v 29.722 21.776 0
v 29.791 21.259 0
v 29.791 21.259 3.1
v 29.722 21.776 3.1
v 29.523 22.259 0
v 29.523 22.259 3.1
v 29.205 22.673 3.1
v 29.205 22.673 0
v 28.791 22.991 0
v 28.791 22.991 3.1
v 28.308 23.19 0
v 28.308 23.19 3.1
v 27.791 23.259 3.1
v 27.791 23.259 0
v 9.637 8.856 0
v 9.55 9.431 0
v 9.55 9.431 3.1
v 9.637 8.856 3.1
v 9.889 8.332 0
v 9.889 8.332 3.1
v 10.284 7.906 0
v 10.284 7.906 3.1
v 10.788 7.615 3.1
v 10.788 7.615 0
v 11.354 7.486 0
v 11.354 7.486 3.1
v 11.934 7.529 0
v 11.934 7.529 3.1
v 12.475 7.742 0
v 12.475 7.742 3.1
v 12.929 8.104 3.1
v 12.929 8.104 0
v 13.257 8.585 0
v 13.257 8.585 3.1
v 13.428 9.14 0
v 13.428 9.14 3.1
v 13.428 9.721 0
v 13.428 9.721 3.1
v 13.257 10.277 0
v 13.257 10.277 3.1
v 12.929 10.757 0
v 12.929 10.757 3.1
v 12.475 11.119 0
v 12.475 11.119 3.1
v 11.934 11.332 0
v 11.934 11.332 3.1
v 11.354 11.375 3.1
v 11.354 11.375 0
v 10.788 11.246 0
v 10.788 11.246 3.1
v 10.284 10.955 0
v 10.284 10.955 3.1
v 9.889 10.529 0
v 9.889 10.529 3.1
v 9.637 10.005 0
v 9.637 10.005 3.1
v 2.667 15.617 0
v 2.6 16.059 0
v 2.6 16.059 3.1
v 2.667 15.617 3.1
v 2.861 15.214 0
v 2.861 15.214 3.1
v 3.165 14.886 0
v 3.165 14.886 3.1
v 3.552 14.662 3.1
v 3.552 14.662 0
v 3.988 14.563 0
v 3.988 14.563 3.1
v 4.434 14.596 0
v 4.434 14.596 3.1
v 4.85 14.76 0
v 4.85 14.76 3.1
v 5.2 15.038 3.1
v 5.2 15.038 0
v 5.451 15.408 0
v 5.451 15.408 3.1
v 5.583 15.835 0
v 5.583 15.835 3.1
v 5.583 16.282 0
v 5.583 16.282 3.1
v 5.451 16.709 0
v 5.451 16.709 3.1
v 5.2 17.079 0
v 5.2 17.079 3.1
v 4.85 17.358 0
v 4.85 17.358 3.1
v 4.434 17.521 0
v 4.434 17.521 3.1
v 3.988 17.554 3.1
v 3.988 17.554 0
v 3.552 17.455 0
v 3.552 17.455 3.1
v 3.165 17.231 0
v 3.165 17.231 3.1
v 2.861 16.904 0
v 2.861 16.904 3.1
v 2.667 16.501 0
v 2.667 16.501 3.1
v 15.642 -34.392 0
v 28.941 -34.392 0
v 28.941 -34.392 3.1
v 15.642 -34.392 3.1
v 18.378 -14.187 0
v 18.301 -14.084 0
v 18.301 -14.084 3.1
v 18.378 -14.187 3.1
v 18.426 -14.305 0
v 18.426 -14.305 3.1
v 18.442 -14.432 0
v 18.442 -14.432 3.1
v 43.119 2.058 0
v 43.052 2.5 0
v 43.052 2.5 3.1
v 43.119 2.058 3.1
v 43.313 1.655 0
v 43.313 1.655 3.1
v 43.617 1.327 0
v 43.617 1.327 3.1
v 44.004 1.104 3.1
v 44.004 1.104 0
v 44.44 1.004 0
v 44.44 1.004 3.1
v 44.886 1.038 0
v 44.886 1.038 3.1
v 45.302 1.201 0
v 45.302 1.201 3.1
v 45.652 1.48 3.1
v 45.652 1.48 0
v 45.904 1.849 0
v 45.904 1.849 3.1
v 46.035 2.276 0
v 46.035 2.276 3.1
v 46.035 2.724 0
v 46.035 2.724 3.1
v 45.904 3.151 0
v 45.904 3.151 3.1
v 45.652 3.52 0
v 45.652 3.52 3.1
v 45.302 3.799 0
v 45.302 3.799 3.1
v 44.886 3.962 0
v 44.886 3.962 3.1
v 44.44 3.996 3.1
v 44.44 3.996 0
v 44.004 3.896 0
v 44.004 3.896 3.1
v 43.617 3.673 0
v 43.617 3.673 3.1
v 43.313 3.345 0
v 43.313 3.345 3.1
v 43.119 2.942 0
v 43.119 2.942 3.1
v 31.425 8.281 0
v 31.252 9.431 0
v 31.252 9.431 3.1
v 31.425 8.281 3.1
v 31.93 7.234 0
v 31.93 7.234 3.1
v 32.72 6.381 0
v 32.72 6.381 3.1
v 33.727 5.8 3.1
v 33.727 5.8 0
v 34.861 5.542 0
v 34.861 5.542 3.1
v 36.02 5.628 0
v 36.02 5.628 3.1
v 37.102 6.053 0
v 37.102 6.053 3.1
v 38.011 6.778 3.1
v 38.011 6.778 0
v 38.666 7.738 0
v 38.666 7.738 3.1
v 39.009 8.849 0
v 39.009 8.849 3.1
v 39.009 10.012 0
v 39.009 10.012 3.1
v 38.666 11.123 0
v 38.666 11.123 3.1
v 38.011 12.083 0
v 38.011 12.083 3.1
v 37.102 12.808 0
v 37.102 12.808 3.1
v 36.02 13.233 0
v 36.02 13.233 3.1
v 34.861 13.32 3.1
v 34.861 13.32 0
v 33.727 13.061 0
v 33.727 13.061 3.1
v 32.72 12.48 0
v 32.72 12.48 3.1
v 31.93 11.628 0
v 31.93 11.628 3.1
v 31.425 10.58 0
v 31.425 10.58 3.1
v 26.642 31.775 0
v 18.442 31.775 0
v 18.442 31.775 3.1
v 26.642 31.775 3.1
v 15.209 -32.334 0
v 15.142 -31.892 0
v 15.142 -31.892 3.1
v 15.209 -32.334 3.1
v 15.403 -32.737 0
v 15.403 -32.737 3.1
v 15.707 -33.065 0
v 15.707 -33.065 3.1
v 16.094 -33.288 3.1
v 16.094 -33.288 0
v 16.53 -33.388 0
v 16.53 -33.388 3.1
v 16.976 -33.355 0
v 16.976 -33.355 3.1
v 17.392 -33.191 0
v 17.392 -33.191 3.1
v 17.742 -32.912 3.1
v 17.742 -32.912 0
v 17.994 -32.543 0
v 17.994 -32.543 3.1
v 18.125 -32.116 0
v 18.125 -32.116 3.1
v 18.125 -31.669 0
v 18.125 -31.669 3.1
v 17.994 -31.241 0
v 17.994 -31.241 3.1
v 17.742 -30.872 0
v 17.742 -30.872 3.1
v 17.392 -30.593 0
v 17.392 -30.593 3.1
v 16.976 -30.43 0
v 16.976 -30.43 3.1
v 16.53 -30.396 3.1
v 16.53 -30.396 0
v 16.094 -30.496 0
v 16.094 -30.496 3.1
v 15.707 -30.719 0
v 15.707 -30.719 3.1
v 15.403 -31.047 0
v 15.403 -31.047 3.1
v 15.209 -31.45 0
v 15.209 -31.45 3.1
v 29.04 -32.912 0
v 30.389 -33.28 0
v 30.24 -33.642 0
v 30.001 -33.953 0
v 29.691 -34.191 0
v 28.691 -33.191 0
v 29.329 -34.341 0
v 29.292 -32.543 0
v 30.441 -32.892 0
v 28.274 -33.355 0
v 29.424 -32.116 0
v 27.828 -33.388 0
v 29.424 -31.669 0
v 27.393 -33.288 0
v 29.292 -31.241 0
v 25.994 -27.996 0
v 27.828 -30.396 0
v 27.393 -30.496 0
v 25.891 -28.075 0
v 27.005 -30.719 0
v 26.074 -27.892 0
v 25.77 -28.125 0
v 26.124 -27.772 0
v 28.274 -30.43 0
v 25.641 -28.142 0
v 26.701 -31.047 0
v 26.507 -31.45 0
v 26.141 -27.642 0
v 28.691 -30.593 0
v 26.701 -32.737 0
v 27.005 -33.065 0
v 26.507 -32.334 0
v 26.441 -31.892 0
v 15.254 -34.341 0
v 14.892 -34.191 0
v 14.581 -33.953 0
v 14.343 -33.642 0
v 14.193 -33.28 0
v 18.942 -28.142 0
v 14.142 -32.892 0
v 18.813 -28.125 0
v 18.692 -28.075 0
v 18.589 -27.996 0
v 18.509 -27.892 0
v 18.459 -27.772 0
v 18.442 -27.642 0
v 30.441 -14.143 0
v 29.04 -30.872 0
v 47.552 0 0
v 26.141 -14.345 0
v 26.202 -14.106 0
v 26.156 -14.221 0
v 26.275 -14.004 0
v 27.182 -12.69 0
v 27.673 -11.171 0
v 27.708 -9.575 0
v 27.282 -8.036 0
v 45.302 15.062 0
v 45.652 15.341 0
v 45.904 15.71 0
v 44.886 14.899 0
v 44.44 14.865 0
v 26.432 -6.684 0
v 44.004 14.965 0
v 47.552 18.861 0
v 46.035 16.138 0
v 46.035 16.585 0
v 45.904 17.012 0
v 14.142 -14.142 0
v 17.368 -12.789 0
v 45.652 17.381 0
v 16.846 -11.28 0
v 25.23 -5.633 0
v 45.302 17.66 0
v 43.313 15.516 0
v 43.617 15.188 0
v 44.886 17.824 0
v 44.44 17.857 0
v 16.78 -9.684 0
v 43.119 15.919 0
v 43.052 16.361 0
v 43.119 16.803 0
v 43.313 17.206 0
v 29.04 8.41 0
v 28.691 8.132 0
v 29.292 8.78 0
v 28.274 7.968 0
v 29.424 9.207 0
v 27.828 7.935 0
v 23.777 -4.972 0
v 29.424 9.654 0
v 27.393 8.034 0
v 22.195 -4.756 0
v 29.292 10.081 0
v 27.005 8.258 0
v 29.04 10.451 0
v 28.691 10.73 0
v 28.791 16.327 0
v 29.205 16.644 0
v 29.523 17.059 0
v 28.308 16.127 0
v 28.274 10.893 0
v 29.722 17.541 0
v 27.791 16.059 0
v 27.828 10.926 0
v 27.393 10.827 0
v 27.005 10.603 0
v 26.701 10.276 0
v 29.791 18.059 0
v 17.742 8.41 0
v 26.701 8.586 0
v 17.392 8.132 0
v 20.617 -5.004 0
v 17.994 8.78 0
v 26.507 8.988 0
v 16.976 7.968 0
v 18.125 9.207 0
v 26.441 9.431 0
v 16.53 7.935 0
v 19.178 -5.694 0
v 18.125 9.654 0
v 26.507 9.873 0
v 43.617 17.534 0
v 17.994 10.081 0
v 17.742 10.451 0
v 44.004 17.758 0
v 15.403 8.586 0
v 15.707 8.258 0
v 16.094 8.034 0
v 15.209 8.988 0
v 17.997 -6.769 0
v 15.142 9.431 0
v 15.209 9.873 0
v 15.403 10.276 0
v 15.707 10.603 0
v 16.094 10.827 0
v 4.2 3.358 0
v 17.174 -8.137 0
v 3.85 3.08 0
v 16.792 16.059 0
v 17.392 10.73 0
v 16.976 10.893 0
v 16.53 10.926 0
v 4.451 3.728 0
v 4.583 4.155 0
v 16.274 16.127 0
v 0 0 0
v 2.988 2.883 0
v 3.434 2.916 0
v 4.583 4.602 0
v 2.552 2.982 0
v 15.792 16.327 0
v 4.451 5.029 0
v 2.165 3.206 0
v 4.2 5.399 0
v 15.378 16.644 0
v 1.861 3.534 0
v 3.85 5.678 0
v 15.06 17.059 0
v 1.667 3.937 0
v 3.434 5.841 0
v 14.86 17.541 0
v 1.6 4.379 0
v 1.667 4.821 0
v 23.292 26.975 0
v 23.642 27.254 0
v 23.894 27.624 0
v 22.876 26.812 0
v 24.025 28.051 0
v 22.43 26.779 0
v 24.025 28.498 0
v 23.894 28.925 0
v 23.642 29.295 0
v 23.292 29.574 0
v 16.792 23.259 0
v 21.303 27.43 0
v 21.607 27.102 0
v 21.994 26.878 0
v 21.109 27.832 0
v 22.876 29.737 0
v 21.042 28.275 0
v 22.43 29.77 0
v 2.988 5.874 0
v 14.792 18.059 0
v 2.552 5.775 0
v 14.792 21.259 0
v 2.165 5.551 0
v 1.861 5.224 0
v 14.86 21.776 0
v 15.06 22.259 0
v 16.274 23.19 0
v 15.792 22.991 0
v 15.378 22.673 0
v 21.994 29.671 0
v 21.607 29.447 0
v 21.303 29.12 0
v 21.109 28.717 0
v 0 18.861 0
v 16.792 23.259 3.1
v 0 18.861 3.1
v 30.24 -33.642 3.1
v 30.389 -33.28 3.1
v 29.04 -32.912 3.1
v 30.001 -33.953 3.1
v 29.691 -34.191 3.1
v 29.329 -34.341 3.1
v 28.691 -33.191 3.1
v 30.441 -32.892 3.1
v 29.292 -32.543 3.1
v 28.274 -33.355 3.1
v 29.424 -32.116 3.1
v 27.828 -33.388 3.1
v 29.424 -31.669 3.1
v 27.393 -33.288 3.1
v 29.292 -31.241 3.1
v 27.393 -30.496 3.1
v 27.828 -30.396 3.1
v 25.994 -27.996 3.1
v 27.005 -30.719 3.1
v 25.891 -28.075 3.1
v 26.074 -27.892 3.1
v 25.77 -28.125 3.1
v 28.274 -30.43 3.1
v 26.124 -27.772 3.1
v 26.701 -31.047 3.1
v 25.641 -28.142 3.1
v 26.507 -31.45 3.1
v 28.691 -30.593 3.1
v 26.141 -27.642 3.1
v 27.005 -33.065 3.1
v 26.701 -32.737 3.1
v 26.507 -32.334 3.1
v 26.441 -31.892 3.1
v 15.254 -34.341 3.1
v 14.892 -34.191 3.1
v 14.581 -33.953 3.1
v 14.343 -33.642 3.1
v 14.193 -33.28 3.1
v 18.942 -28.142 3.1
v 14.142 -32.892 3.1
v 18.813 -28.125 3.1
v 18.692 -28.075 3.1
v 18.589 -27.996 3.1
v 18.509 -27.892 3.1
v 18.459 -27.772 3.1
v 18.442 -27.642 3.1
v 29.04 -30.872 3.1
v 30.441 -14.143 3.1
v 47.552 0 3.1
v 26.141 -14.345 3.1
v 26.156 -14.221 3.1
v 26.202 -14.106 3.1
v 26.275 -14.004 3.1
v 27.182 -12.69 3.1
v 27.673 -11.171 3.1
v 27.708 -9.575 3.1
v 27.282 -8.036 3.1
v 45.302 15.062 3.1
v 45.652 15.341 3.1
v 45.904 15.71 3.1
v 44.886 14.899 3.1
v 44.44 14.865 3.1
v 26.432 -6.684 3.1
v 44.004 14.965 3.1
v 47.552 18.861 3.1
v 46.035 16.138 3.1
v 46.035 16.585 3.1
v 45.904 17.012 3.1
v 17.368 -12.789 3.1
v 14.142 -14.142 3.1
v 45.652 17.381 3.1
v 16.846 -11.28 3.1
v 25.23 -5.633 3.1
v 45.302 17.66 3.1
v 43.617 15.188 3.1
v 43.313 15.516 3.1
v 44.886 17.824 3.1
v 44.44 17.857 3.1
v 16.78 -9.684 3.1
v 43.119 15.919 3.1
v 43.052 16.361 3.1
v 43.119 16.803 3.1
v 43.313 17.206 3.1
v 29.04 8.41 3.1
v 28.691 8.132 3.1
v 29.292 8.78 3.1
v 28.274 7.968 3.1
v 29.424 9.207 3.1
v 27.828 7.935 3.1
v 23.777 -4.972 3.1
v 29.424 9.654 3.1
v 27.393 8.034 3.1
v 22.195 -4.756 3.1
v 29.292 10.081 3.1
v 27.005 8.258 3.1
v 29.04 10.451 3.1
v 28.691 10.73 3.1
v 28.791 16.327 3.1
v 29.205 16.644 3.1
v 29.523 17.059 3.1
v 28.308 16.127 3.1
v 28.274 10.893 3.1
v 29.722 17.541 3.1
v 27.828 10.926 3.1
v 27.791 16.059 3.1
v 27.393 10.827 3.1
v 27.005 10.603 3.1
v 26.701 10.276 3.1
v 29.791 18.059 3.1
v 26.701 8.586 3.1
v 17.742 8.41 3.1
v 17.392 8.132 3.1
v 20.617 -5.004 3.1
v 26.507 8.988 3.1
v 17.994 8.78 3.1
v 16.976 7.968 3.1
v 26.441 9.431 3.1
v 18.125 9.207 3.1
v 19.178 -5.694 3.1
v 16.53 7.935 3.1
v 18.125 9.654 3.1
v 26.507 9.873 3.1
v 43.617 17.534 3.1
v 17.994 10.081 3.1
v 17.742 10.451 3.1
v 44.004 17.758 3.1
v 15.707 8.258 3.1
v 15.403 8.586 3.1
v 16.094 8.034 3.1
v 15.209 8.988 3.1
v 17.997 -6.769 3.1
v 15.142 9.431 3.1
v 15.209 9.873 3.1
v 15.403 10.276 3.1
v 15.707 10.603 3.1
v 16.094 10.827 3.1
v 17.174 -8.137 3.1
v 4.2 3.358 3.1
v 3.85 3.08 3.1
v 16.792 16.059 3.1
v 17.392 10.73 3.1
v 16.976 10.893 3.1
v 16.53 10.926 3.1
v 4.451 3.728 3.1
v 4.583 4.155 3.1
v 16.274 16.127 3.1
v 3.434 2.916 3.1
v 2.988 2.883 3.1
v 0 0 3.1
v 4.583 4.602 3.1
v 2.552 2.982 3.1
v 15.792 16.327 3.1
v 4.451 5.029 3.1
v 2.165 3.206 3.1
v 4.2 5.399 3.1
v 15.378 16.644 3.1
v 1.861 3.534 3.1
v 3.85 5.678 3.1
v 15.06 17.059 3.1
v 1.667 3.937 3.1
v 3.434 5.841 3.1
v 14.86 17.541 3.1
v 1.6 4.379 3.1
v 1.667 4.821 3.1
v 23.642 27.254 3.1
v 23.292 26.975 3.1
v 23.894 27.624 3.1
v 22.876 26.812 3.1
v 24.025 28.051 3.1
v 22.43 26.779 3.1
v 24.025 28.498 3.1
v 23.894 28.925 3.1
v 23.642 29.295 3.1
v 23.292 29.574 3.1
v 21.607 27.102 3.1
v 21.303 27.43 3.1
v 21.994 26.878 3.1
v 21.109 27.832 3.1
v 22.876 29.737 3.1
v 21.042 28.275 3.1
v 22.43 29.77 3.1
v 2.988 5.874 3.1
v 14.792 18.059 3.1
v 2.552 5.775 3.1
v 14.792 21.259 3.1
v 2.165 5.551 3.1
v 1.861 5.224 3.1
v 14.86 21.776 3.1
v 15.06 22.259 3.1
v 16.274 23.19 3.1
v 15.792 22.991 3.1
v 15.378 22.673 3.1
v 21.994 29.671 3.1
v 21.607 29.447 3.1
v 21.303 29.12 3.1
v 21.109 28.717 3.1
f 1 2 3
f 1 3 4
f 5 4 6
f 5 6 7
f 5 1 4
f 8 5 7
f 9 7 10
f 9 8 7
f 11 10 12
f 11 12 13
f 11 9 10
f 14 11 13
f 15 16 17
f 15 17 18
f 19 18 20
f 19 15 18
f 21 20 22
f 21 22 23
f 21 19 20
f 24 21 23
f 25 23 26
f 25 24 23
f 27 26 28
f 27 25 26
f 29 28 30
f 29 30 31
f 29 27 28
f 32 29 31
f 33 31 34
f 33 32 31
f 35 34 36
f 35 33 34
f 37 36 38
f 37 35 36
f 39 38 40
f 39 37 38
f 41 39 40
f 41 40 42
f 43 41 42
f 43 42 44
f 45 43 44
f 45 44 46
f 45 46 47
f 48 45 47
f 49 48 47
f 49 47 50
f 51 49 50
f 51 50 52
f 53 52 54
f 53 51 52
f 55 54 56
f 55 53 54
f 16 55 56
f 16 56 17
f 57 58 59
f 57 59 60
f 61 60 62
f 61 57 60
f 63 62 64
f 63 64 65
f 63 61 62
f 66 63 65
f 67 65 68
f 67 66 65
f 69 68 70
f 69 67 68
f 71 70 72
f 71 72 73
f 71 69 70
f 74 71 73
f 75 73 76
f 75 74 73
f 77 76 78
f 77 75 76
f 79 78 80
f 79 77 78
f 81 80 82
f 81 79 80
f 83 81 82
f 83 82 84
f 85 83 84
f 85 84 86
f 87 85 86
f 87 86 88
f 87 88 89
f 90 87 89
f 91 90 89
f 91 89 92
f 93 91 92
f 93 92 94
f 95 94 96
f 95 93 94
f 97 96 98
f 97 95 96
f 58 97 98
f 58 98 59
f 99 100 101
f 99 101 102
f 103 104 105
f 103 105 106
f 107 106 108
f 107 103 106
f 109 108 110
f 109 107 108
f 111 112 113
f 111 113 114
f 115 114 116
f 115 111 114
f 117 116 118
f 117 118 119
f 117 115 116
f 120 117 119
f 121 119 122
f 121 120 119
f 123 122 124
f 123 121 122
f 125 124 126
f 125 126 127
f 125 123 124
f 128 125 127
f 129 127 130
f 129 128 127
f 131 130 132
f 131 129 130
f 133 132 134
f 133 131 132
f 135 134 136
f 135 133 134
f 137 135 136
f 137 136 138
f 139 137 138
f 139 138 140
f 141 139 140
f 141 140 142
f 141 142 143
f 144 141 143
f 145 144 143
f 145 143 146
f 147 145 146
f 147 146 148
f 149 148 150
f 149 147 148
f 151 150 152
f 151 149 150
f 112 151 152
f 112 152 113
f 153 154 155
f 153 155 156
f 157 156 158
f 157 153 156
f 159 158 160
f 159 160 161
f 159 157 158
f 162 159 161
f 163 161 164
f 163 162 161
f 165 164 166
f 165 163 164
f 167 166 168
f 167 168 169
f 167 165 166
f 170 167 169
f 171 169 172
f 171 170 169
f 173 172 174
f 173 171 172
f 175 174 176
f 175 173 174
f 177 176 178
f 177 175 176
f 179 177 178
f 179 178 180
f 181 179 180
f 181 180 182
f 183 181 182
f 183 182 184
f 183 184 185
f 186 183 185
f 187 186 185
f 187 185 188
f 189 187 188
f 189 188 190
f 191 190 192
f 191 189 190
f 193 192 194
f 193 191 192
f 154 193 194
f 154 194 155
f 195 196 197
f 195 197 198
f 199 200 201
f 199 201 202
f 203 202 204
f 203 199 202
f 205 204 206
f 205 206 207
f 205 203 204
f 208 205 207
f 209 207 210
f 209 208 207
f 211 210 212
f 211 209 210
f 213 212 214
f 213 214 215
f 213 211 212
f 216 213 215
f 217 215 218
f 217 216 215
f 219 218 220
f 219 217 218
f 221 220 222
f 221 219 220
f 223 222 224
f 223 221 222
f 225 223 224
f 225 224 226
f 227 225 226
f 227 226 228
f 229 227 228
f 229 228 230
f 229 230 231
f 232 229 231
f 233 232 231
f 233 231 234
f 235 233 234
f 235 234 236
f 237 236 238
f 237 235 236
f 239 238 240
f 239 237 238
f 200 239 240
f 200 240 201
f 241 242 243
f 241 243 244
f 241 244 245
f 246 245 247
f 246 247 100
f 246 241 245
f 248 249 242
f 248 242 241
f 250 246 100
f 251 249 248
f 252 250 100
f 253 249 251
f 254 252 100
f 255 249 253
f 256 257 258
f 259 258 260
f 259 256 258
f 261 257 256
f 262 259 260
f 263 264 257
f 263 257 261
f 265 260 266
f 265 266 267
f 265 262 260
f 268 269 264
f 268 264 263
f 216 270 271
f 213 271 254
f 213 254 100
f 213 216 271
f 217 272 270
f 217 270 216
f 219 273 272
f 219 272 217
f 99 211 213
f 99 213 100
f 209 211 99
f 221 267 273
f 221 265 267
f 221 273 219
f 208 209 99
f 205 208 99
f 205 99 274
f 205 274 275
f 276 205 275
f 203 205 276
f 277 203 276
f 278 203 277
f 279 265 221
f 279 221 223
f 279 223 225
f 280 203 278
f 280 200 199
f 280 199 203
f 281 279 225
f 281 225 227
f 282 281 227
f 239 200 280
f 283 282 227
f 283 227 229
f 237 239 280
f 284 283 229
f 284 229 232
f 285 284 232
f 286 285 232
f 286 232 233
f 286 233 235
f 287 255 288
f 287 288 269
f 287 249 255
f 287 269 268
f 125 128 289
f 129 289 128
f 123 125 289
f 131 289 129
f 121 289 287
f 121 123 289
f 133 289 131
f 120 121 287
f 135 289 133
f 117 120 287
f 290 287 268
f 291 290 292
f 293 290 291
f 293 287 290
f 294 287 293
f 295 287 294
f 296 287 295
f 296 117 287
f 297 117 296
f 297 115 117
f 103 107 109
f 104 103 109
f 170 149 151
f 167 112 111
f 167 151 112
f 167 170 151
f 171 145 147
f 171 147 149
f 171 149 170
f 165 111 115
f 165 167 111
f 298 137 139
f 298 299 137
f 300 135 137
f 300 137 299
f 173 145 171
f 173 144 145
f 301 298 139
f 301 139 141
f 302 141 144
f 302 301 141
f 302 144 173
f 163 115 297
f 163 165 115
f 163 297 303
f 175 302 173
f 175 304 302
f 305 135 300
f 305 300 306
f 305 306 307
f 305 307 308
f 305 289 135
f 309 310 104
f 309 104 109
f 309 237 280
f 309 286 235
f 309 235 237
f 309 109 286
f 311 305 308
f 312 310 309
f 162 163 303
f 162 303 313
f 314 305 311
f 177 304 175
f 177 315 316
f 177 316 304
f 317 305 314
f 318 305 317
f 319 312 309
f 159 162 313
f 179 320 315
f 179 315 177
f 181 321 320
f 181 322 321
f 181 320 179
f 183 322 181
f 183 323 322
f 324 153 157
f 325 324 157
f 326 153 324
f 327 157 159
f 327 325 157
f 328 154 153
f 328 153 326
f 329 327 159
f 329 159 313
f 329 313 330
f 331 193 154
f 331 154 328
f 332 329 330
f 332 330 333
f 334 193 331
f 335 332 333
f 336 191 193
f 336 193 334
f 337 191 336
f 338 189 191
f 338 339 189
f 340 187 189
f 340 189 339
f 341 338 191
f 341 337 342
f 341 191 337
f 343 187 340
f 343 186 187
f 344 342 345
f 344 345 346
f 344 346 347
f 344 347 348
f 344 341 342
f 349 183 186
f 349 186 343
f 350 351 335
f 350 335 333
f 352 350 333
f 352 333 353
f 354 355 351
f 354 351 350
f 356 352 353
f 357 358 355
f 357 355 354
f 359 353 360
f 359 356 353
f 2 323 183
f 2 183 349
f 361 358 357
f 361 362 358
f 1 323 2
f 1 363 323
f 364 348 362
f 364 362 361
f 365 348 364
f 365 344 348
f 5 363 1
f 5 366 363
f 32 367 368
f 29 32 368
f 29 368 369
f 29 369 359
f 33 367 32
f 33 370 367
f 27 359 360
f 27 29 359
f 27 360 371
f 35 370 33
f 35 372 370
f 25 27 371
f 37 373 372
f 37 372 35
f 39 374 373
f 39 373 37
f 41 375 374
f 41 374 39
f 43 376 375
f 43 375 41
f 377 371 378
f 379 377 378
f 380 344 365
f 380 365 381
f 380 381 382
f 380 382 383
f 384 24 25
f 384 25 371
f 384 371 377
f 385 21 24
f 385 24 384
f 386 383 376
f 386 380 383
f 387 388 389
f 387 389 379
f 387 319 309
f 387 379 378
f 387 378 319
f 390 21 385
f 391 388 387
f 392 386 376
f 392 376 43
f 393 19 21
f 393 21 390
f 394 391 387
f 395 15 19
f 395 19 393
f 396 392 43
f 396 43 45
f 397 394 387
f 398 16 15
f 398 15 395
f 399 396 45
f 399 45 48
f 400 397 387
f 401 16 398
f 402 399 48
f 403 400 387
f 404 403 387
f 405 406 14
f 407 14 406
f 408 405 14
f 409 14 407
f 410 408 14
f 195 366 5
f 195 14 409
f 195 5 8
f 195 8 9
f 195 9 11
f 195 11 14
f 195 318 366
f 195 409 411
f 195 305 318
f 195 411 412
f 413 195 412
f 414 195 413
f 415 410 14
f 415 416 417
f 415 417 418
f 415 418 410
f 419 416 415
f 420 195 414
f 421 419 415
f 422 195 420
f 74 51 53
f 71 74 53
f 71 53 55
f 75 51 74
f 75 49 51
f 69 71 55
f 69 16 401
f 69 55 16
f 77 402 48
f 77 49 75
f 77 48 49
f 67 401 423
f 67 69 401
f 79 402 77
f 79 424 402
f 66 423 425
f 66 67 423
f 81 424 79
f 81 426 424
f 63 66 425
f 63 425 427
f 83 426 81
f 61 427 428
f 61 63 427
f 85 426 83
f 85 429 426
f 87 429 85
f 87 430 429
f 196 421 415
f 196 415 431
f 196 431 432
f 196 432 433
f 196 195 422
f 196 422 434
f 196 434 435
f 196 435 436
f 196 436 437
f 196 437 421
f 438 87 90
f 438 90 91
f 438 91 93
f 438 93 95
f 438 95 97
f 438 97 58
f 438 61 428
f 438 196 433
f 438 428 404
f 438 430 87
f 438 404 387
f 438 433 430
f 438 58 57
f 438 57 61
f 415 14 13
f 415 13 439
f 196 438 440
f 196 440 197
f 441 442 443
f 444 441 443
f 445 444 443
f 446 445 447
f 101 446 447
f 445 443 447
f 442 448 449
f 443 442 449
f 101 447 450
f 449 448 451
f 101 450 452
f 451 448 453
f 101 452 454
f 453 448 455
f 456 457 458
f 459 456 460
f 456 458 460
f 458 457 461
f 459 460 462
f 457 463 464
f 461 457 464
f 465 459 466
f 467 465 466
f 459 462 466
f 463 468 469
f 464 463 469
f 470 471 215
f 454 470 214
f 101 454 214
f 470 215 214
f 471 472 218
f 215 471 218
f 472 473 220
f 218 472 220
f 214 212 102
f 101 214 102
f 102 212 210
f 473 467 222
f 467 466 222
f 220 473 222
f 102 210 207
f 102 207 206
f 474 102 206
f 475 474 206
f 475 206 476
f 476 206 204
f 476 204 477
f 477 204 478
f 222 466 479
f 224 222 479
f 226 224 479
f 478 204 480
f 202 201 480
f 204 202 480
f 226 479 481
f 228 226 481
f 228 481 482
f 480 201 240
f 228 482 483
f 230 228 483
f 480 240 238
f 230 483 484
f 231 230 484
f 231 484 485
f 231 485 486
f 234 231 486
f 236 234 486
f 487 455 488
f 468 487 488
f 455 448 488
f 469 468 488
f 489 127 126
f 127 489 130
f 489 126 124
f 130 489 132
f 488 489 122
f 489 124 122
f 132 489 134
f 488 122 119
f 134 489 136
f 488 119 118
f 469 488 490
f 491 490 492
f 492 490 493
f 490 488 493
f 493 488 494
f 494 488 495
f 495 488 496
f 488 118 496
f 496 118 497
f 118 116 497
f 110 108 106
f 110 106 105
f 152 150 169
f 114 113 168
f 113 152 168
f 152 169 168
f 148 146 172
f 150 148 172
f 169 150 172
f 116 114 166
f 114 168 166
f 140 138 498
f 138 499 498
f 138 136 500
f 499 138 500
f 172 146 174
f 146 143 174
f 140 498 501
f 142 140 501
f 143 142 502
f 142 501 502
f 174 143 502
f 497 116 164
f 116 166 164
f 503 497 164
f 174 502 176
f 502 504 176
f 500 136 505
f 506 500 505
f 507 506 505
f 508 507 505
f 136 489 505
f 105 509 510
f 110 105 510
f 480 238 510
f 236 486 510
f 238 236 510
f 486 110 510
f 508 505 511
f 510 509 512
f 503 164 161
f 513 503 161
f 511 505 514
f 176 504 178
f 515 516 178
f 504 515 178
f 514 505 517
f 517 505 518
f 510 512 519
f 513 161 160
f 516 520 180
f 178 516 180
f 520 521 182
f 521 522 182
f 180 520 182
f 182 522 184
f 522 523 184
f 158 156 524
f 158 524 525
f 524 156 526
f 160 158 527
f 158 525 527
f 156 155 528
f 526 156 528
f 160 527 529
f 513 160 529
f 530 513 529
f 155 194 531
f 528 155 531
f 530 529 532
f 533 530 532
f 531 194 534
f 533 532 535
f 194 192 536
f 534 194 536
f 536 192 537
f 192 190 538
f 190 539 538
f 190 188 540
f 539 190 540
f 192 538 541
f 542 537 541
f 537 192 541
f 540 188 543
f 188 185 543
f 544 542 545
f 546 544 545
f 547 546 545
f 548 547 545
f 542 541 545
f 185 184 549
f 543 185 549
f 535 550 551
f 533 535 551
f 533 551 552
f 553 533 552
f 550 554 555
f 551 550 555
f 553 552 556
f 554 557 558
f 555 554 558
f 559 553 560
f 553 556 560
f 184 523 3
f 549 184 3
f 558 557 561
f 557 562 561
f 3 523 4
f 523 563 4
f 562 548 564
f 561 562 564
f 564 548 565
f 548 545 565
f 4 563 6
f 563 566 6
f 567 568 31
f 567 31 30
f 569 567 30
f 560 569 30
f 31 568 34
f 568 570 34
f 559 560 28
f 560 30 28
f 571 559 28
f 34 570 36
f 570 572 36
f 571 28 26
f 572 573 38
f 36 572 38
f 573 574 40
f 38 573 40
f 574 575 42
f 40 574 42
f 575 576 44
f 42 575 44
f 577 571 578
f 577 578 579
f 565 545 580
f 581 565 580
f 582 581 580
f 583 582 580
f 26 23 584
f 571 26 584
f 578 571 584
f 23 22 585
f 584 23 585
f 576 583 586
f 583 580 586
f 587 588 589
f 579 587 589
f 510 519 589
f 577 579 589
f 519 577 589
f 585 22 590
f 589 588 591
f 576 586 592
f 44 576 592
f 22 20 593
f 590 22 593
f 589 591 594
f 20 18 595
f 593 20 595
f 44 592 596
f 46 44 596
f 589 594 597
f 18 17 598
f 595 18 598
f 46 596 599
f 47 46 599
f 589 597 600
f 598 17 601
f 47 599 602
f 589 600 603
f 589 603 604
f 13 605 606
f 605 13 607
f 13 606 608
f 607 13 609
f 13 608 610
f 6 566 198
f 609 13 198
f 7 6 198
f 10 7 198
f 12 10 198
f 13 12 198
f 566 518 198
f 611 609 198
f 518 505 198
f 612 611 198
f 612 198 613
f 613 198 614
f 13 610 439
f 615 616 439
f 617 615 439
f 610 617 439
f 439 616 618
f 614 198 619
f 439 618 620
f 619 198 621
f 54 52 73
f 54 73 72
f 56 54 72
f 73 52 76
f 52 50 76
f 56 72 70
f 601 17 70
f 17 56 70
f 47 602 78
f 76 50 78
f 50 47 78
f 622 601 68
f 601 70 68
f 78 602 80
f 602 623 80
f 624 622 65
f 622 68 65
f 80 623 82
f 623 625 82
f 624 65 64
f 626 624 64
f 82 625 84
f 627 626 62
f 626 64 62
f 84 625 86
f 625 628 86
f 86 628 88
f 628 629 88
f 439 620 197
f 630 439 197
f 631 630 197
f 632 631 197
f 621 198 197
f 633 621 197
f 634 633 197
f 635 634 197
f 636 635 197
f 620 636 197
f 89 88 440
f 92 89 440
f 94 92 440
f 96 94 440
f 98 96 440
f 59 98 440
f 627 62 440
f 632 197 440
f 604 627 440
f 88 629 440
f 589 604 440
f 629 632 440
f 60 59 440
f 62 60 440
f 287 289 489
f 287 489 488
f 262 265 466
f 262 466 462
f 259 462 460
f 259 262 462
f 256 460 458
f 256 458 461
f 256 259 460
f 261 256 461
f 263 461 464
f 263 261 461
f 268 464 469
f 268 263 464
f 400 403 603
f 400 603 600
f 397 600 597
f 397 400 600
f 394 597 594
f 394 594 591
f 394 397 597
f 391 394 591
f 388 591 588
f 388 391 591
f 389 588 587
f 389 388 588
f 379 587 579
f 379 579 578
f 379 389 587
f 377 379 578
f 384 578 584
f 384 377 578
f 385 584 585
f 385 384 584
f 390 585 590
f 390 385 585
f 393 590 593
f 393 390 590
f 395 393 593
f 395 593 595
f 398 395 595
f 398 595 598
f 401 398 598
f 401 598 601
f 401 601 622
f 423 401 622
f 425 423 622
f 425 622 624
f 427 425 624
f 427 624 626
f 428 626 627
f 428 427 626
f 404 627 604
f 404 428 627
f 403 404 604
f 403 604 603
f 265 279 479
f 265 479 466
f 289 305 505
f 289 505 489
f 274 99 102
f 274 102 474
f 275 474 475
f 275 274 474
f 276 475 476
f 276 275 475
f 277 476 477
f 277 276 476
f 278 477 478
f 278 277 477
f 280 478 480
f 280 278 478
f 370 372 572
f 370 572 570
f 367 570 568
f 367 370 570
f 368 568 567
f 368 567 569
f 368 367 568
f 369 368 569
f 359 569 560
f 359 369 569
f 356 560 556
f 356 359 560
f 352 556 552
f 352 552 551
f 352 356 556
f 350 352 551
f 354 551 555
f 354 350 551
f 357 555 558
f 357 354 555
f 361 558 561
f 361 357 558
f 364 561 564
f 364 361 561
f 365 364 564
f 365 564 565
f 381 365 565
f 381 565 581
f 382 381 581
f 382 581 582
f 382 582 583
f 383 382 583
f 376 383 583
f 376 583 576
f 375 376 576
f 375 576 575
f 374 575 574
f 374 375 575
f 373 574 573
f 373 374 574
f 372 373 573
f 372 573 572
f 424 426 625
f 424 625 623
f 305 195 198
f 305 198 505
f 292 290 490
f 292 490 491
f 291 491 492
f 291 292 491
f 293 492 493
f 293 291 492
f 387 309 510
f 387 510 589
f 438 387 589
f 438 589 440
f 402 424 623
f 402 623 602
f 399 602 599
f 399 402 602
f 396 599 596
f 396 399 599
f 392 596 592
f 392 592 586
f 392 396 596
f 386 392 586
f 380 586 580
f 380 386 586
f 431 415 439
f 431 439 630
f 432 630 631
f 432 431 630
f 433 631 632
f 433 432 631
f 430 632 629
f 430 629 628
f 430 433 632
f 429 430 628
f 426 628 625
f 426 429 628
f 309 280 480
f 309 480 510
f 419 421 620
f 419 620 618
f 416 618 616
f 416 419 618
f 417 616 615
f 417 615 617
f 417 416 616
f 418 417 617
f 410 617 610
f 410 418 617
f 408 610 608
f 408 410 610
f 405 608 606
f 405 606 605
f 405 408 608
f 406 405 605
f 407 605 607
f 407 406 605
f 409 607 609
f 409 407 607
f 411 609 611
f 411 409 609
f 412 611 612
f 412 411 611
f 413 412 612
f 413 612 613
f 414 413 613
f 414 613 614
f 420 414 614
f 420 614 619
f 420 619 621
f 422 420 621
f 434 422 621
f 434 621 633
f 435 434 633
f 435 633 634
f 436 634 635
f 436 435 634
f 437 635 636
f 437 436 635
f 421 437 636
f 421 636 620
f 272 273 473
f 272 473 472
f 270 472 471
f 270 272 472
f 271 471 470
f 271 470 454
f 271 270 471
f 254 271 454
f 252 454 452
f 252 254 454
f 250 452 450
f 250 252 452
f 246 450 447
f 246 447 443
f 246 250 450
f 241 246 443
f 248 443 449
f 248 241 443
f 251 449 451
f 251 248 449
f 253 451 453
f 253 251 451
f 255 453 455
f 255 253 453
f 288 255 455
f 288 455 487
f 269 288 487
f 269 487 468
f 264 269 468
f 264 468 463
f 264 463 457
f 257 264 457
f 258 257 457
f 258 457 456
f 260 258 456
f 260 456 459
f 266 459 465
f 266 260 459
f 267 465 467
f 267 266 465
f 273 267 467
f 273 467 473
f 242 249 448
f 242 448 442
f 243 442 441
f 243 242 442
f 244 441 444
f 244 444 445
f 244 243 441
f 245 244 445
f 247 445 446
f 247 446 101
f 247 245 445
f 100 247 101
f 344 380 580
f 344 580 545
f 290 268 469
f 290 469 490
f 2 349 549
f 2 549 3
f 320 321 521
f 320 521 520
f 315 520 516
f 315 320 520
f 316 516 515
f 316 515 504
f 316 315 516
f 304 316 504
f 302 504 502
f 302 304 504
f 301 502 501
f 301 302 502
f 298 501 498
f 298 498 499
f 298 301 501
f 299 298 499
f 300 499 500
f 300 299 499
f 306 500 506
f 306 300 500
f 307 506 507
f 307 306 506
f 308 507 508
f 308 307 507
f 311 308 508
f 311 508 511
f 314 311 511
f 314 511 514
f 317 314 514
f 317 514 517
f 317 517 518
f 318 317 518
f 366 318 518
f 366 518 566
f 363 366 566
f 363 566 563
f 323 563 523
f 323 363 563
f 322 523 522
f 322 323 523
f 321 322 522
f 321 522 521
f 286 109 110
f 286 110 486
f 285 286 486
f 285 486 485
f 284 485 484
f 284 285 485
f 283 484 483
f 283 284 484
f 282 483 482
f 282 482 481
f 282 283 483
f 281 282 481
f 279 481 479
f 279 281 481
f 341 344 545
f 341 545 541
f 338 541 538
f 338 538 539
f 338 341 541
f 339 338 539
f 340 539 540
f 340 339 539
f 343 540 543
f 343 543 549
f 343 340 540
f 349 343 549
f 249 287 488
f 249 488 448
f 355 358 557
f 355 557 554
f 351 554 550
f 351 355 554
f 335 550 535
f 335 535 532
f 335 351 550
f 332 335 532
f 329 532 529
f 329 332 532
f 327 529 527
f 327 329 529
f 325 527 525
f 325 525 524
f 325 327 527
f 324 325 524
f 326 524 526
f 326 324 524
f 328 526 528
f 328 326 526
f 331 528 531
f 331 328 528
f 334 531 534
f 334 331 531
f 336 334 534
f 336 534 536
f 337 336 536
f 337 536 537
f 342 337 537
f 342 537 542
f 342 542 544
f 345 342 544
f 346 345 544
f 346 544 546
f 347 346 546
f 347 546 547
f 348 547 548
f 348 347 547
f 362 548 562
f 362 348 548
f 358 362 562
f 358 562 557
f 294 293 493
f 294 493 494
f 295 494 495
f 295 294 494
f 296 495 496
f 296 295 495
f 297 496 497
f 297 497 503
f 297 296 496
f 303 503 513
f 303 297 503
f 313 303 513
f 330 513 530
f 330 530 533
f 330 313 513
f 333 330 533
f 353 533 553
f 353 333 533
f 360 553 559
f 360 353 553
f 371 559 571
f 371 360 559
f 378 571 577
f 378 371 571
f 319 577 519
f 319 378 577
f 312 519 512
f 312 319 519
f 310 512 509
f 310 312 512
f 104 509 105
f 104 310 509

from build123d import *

# Parameters (mm, degrees)
SKETCH1_R           = 1.5
SKETCH1_R_2         = 1.95
SKETCH1_R_3         = 3.9
BOSS_EXTRUDE1_DEPTH = 3.1


with BuildPart() as part:
    # Sketch1 → Boss-Extrude1 (new body)
    with BuildSketch(Plane.XY):
        with BuildLine():
            Line((0, 0), (0, 18.861213353))
            Line((0, 18.861213353), (18.442135624, 31.774535738))
            Line((18.442135624, 31.774535738), (26.642135624, 31.774535738))
            Line((26.642135624, 31.774535738), (47.552083318, 18.861213353))
            Line((47.552083318, 18.861213353), (47.552083318, 0))
            Line((47.552083318, 0), (30.440578527, -14.143422634))
            Line((30.440578527, -14.143422634), (30.440578527, -32.892135624))
            ThreePointArc((30.440578527, -32.892135624), (30.001238699, -33.952795796), (28.940578527, -34.392135624))
            Line((28.940578527, -34.392135624), (15.642135624, -34.392135624))
            ThreePointArc((15.642135624, -34.392135624), (14.581475452, -33.952795796), (14.142135624, -32.892135624))
            Line((14.142135624, -32.892135624), (14.142135624, -14.142135624))
            Line((14.142135624, -14.142135624), (0, 0))
        make_face()
        with Locations(Location((4.1, 16.058642392, 0), (0, 0, 180))):
            Circle(SKETCH1_R, mode=Mode.SUBTRACT)
        with Locations(Location((3.1, 4.378644873, 0), (0, 0, 180))):
            Circle(SKETCH1_R, mode=Mode.SUBTRACT)
        with Locations(Location((11.5, 9.430606677, 0), (0, 0, 180))):
            Circle(SKETCH1_R_2, mode=Mode.SUBTRACT)
        with Locations(Location((35.152083318, 9.430606677, 0), (0, 0, 180))):
            Circle(SKETCH1_R_3, mode=Mode.SUBTRACT)
        with Locations(Location((16.642135624, -31.892135624, 0), (0, 0, 180))):
            Circle(SKETCH1_R, mode=Mode.SUBTRACT)
        with Locations(Location((27.940578527, -31.892135624, 0), (0, 0, 180))):
            Circle(SKETCH1_R, mode=Mode.SUBTRACT)
        with Locations(Location((16.642135624, 9.430606677, 0), (0, 0, 180))):
            Circle(SKETCH1_R, mode=Mode.SUBTRACT)
        with Locations(Location((27.940578527, 9.430606677, 0), (0, 0, 180))):
            Circle(SKETCH1_R, mode=Mode.SUBTRACT)
        with Locations(Location((22.542135624, 28.274535738, 0), (0, 0, 180))):
            Circle(SKETCH1_R, mode=Mode.SUBTRACT)
        with Locations(Location((44.552083318, 2.5, 0), (0, 0, 180))):
            Circle(SKETCH1_R, mode=Mode.SUBTRACT)
        with Locations(Location((44.552083318, 16.361213353, 0), (0, 0, 180))):
            Circle(SKETCH1_R, mode=Mode.SUBTRACT)
        with BuildLine():
            Line((18.442135624, -14.432395526), (18.442135624, -27.642135624))
            ThreePointArc((18.442135624, -27.642135624), (18.588582233, -27.995689014), (18.942135624, -28.142135624))
            Line((18.942135624, -28.142135624), (25.640578527, -28.142135624))
            ThreePointArc((25.640578527, -28.142135624), (25.994131918, -27.995689014), (26.140578527, -27.642135624))
            Line((26.140578527, -27.642135624), (26.140578527, -14.345175543))
            ThreePointArc((26.140578527, -14.345175543), (26.175312874, -14.162069365), (26.274690017, -14.004403481))
            ThreePointArc((26.274690017, -14.004403481), (22.194770242, -4.756187266), (18.301117356, -14.084355132))
            ThreePointArc((18.301117356, -14.084355132), (18.405541961, -14.24463353), (18.442135624, -14.432395526))
        make_face(mode=Mode.SUBTRACT)
        with BuildLine():
            Line((16.792135624, 16.058642392), (27.790578527, 16.058642392))
            ThreePointArc((27.790578527, 16.058642392), (29.204792089, 16.64442883), (29.790578527, 18.058642392))
            Line((29.790578527, 18.058642392), (29.790578527, 21.258642392))
            ThreePointArc((29.790578527, 21.258642392), (29.204792089, 22.672855954), (27.790578527, 23.258642392))
            Line((27.790578527, 23.258642392), (16.792135624, 23.258642392))
            ThreePointArc((16.792135624, 23.258642392), (15.377922061, 22.672855954), (14.792135624, 21.258642392))
            Line((14.792135624, 21.258642392), (14.792135624, 18.058642392))
            ThreePointArc((14.792135624, 18.058642392), (15.377922061, 16.64442883), (16.792135624, 16.058642392))
        make_face(mode=Mode.SUBTRACT)
    extrude(amount=BOSS_EXTRUDE1_DEPTH)


solid = part.part
